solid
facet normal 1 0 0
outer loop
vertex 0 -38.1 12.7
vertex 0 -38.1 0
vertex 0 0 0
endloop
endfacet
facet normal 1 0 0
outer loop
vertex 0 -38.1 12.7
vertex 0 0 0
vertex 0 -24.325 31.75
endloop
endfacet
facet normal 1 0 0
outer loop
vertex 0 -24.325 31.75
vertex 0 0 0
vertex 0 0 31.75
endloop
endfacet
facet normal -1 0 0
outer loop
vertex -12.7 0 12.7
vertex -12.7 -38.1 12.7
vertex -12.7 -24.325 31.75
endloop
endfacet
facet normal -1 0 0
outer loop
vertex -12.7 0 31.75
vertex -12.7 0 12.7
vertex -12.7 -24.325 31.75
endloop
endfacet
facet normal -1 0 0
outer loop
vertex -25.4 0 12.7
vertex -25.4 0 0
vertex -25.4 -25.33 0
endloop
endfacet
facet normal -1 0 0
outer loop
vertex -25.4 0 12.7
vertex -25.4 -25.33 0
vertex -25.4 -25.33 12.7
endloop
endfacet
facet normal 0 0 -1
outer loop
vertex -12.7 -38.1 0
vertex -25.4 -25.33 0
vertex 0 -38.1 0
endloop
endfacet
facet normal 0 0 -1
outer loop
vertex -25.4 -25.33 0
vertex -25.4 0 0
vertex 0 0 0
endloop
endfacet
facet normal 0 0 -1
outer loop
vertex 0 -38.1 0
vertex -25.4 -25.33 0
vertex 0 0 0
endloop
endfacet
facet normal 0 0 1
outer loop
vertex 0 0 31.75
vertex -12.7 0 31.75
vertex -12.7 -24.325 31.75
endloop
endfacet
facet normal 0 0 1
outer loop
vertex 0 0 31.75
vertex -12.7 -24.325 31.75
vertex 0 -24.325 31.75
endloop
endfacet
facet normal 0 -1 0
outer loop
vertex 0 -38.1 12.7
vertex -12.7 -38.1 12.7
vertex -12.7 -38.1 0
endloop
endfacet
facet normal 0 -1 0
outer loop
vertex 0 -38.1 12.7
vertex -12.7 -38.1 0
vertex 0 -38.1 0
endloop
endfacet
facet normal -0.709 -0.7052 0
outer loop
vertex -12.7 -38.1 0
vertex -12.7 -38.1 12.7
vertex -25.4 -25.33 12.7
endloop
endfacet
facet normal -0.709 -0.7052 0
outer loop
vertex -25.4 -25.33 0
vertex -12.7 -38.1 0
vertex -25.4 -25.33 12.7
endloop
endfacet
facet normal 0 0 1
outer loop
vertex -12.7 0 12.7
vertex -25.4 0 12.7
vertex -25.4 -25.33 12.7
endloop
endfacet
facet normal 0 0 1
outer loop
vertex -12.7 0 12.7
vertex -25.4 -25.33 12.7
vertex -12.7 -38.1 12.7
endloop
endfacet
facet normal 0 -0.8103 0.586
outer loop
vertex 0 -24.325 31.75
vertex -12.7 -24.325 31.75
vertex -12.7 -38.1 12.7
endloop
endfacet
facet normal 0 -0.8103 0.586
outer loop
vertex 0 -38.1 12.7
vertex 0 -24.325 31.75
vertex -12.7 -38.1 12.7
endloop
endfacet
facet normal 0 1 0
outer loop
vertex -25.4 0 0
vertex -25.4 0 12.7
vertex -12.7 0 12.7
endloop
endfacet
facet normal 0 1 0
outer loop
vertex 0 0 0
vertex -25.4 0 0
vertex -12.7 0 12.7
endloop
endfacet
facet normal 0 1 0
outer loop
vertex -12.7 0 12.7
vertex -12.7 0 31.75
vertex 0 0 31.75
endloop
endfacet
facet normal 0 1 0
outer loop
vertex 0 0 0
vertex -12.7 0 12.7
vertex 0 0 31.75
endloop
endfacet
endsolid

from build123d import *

# Parameters (mm, degrees)
F0_W     = 25.4
F0_H     = 31.75
F1_DEPTH = 38.1
F2_W     = 12.7
F2_H     = 19.05
F3_DEPTH = 38.1
F5_DEPTH = 25.4
F7_DEPTH = 25.4


with BuildPart() as f1:
    # F0 (on Front) → F1 (new body)
    with BuildSketch(Plane.XZ):
        with Locations((-12.7, 15.875)):
            Rectangle(F0_W, F0_H)
    extrude(amount=F1_DEPTH)

    # F2 (on face) → F3 (cut)
    with BuildSketch(Plane.XZ.offset(38.1)):
        with Locations((-19.05, 22.225)):
            Rectangle(F2_W, F2_H)
    extrude(amount=-F3_DEPTH, mode=Mode.SUBTRACT)

    # F4 (on face) → F5 (cut)
    with BuildSketch(Plane.XY.offset(12.7)):
        Polygon((-25.4, -38.1), (-12.7, -38.1), (-25.4, -25.3298), align=None)
    extrude(amount=-F5_DEPTH, mode=Mode.SUBTRACT)

    # F6 (on face) → F7 (cut)
    with BuildSketch(Plane(origin=(-12.7, 0, 0), x_dir=(0, -1, 0), z_dir=(-1, 0, 0))):
        Polygon((24.324648, 31.75), (38.1, 12.7), (38.1, 31.75), align=None)
    extrude(amount=-F7_DEPTH, mode=Mode.SUBTRACT)


solid = f1.part
